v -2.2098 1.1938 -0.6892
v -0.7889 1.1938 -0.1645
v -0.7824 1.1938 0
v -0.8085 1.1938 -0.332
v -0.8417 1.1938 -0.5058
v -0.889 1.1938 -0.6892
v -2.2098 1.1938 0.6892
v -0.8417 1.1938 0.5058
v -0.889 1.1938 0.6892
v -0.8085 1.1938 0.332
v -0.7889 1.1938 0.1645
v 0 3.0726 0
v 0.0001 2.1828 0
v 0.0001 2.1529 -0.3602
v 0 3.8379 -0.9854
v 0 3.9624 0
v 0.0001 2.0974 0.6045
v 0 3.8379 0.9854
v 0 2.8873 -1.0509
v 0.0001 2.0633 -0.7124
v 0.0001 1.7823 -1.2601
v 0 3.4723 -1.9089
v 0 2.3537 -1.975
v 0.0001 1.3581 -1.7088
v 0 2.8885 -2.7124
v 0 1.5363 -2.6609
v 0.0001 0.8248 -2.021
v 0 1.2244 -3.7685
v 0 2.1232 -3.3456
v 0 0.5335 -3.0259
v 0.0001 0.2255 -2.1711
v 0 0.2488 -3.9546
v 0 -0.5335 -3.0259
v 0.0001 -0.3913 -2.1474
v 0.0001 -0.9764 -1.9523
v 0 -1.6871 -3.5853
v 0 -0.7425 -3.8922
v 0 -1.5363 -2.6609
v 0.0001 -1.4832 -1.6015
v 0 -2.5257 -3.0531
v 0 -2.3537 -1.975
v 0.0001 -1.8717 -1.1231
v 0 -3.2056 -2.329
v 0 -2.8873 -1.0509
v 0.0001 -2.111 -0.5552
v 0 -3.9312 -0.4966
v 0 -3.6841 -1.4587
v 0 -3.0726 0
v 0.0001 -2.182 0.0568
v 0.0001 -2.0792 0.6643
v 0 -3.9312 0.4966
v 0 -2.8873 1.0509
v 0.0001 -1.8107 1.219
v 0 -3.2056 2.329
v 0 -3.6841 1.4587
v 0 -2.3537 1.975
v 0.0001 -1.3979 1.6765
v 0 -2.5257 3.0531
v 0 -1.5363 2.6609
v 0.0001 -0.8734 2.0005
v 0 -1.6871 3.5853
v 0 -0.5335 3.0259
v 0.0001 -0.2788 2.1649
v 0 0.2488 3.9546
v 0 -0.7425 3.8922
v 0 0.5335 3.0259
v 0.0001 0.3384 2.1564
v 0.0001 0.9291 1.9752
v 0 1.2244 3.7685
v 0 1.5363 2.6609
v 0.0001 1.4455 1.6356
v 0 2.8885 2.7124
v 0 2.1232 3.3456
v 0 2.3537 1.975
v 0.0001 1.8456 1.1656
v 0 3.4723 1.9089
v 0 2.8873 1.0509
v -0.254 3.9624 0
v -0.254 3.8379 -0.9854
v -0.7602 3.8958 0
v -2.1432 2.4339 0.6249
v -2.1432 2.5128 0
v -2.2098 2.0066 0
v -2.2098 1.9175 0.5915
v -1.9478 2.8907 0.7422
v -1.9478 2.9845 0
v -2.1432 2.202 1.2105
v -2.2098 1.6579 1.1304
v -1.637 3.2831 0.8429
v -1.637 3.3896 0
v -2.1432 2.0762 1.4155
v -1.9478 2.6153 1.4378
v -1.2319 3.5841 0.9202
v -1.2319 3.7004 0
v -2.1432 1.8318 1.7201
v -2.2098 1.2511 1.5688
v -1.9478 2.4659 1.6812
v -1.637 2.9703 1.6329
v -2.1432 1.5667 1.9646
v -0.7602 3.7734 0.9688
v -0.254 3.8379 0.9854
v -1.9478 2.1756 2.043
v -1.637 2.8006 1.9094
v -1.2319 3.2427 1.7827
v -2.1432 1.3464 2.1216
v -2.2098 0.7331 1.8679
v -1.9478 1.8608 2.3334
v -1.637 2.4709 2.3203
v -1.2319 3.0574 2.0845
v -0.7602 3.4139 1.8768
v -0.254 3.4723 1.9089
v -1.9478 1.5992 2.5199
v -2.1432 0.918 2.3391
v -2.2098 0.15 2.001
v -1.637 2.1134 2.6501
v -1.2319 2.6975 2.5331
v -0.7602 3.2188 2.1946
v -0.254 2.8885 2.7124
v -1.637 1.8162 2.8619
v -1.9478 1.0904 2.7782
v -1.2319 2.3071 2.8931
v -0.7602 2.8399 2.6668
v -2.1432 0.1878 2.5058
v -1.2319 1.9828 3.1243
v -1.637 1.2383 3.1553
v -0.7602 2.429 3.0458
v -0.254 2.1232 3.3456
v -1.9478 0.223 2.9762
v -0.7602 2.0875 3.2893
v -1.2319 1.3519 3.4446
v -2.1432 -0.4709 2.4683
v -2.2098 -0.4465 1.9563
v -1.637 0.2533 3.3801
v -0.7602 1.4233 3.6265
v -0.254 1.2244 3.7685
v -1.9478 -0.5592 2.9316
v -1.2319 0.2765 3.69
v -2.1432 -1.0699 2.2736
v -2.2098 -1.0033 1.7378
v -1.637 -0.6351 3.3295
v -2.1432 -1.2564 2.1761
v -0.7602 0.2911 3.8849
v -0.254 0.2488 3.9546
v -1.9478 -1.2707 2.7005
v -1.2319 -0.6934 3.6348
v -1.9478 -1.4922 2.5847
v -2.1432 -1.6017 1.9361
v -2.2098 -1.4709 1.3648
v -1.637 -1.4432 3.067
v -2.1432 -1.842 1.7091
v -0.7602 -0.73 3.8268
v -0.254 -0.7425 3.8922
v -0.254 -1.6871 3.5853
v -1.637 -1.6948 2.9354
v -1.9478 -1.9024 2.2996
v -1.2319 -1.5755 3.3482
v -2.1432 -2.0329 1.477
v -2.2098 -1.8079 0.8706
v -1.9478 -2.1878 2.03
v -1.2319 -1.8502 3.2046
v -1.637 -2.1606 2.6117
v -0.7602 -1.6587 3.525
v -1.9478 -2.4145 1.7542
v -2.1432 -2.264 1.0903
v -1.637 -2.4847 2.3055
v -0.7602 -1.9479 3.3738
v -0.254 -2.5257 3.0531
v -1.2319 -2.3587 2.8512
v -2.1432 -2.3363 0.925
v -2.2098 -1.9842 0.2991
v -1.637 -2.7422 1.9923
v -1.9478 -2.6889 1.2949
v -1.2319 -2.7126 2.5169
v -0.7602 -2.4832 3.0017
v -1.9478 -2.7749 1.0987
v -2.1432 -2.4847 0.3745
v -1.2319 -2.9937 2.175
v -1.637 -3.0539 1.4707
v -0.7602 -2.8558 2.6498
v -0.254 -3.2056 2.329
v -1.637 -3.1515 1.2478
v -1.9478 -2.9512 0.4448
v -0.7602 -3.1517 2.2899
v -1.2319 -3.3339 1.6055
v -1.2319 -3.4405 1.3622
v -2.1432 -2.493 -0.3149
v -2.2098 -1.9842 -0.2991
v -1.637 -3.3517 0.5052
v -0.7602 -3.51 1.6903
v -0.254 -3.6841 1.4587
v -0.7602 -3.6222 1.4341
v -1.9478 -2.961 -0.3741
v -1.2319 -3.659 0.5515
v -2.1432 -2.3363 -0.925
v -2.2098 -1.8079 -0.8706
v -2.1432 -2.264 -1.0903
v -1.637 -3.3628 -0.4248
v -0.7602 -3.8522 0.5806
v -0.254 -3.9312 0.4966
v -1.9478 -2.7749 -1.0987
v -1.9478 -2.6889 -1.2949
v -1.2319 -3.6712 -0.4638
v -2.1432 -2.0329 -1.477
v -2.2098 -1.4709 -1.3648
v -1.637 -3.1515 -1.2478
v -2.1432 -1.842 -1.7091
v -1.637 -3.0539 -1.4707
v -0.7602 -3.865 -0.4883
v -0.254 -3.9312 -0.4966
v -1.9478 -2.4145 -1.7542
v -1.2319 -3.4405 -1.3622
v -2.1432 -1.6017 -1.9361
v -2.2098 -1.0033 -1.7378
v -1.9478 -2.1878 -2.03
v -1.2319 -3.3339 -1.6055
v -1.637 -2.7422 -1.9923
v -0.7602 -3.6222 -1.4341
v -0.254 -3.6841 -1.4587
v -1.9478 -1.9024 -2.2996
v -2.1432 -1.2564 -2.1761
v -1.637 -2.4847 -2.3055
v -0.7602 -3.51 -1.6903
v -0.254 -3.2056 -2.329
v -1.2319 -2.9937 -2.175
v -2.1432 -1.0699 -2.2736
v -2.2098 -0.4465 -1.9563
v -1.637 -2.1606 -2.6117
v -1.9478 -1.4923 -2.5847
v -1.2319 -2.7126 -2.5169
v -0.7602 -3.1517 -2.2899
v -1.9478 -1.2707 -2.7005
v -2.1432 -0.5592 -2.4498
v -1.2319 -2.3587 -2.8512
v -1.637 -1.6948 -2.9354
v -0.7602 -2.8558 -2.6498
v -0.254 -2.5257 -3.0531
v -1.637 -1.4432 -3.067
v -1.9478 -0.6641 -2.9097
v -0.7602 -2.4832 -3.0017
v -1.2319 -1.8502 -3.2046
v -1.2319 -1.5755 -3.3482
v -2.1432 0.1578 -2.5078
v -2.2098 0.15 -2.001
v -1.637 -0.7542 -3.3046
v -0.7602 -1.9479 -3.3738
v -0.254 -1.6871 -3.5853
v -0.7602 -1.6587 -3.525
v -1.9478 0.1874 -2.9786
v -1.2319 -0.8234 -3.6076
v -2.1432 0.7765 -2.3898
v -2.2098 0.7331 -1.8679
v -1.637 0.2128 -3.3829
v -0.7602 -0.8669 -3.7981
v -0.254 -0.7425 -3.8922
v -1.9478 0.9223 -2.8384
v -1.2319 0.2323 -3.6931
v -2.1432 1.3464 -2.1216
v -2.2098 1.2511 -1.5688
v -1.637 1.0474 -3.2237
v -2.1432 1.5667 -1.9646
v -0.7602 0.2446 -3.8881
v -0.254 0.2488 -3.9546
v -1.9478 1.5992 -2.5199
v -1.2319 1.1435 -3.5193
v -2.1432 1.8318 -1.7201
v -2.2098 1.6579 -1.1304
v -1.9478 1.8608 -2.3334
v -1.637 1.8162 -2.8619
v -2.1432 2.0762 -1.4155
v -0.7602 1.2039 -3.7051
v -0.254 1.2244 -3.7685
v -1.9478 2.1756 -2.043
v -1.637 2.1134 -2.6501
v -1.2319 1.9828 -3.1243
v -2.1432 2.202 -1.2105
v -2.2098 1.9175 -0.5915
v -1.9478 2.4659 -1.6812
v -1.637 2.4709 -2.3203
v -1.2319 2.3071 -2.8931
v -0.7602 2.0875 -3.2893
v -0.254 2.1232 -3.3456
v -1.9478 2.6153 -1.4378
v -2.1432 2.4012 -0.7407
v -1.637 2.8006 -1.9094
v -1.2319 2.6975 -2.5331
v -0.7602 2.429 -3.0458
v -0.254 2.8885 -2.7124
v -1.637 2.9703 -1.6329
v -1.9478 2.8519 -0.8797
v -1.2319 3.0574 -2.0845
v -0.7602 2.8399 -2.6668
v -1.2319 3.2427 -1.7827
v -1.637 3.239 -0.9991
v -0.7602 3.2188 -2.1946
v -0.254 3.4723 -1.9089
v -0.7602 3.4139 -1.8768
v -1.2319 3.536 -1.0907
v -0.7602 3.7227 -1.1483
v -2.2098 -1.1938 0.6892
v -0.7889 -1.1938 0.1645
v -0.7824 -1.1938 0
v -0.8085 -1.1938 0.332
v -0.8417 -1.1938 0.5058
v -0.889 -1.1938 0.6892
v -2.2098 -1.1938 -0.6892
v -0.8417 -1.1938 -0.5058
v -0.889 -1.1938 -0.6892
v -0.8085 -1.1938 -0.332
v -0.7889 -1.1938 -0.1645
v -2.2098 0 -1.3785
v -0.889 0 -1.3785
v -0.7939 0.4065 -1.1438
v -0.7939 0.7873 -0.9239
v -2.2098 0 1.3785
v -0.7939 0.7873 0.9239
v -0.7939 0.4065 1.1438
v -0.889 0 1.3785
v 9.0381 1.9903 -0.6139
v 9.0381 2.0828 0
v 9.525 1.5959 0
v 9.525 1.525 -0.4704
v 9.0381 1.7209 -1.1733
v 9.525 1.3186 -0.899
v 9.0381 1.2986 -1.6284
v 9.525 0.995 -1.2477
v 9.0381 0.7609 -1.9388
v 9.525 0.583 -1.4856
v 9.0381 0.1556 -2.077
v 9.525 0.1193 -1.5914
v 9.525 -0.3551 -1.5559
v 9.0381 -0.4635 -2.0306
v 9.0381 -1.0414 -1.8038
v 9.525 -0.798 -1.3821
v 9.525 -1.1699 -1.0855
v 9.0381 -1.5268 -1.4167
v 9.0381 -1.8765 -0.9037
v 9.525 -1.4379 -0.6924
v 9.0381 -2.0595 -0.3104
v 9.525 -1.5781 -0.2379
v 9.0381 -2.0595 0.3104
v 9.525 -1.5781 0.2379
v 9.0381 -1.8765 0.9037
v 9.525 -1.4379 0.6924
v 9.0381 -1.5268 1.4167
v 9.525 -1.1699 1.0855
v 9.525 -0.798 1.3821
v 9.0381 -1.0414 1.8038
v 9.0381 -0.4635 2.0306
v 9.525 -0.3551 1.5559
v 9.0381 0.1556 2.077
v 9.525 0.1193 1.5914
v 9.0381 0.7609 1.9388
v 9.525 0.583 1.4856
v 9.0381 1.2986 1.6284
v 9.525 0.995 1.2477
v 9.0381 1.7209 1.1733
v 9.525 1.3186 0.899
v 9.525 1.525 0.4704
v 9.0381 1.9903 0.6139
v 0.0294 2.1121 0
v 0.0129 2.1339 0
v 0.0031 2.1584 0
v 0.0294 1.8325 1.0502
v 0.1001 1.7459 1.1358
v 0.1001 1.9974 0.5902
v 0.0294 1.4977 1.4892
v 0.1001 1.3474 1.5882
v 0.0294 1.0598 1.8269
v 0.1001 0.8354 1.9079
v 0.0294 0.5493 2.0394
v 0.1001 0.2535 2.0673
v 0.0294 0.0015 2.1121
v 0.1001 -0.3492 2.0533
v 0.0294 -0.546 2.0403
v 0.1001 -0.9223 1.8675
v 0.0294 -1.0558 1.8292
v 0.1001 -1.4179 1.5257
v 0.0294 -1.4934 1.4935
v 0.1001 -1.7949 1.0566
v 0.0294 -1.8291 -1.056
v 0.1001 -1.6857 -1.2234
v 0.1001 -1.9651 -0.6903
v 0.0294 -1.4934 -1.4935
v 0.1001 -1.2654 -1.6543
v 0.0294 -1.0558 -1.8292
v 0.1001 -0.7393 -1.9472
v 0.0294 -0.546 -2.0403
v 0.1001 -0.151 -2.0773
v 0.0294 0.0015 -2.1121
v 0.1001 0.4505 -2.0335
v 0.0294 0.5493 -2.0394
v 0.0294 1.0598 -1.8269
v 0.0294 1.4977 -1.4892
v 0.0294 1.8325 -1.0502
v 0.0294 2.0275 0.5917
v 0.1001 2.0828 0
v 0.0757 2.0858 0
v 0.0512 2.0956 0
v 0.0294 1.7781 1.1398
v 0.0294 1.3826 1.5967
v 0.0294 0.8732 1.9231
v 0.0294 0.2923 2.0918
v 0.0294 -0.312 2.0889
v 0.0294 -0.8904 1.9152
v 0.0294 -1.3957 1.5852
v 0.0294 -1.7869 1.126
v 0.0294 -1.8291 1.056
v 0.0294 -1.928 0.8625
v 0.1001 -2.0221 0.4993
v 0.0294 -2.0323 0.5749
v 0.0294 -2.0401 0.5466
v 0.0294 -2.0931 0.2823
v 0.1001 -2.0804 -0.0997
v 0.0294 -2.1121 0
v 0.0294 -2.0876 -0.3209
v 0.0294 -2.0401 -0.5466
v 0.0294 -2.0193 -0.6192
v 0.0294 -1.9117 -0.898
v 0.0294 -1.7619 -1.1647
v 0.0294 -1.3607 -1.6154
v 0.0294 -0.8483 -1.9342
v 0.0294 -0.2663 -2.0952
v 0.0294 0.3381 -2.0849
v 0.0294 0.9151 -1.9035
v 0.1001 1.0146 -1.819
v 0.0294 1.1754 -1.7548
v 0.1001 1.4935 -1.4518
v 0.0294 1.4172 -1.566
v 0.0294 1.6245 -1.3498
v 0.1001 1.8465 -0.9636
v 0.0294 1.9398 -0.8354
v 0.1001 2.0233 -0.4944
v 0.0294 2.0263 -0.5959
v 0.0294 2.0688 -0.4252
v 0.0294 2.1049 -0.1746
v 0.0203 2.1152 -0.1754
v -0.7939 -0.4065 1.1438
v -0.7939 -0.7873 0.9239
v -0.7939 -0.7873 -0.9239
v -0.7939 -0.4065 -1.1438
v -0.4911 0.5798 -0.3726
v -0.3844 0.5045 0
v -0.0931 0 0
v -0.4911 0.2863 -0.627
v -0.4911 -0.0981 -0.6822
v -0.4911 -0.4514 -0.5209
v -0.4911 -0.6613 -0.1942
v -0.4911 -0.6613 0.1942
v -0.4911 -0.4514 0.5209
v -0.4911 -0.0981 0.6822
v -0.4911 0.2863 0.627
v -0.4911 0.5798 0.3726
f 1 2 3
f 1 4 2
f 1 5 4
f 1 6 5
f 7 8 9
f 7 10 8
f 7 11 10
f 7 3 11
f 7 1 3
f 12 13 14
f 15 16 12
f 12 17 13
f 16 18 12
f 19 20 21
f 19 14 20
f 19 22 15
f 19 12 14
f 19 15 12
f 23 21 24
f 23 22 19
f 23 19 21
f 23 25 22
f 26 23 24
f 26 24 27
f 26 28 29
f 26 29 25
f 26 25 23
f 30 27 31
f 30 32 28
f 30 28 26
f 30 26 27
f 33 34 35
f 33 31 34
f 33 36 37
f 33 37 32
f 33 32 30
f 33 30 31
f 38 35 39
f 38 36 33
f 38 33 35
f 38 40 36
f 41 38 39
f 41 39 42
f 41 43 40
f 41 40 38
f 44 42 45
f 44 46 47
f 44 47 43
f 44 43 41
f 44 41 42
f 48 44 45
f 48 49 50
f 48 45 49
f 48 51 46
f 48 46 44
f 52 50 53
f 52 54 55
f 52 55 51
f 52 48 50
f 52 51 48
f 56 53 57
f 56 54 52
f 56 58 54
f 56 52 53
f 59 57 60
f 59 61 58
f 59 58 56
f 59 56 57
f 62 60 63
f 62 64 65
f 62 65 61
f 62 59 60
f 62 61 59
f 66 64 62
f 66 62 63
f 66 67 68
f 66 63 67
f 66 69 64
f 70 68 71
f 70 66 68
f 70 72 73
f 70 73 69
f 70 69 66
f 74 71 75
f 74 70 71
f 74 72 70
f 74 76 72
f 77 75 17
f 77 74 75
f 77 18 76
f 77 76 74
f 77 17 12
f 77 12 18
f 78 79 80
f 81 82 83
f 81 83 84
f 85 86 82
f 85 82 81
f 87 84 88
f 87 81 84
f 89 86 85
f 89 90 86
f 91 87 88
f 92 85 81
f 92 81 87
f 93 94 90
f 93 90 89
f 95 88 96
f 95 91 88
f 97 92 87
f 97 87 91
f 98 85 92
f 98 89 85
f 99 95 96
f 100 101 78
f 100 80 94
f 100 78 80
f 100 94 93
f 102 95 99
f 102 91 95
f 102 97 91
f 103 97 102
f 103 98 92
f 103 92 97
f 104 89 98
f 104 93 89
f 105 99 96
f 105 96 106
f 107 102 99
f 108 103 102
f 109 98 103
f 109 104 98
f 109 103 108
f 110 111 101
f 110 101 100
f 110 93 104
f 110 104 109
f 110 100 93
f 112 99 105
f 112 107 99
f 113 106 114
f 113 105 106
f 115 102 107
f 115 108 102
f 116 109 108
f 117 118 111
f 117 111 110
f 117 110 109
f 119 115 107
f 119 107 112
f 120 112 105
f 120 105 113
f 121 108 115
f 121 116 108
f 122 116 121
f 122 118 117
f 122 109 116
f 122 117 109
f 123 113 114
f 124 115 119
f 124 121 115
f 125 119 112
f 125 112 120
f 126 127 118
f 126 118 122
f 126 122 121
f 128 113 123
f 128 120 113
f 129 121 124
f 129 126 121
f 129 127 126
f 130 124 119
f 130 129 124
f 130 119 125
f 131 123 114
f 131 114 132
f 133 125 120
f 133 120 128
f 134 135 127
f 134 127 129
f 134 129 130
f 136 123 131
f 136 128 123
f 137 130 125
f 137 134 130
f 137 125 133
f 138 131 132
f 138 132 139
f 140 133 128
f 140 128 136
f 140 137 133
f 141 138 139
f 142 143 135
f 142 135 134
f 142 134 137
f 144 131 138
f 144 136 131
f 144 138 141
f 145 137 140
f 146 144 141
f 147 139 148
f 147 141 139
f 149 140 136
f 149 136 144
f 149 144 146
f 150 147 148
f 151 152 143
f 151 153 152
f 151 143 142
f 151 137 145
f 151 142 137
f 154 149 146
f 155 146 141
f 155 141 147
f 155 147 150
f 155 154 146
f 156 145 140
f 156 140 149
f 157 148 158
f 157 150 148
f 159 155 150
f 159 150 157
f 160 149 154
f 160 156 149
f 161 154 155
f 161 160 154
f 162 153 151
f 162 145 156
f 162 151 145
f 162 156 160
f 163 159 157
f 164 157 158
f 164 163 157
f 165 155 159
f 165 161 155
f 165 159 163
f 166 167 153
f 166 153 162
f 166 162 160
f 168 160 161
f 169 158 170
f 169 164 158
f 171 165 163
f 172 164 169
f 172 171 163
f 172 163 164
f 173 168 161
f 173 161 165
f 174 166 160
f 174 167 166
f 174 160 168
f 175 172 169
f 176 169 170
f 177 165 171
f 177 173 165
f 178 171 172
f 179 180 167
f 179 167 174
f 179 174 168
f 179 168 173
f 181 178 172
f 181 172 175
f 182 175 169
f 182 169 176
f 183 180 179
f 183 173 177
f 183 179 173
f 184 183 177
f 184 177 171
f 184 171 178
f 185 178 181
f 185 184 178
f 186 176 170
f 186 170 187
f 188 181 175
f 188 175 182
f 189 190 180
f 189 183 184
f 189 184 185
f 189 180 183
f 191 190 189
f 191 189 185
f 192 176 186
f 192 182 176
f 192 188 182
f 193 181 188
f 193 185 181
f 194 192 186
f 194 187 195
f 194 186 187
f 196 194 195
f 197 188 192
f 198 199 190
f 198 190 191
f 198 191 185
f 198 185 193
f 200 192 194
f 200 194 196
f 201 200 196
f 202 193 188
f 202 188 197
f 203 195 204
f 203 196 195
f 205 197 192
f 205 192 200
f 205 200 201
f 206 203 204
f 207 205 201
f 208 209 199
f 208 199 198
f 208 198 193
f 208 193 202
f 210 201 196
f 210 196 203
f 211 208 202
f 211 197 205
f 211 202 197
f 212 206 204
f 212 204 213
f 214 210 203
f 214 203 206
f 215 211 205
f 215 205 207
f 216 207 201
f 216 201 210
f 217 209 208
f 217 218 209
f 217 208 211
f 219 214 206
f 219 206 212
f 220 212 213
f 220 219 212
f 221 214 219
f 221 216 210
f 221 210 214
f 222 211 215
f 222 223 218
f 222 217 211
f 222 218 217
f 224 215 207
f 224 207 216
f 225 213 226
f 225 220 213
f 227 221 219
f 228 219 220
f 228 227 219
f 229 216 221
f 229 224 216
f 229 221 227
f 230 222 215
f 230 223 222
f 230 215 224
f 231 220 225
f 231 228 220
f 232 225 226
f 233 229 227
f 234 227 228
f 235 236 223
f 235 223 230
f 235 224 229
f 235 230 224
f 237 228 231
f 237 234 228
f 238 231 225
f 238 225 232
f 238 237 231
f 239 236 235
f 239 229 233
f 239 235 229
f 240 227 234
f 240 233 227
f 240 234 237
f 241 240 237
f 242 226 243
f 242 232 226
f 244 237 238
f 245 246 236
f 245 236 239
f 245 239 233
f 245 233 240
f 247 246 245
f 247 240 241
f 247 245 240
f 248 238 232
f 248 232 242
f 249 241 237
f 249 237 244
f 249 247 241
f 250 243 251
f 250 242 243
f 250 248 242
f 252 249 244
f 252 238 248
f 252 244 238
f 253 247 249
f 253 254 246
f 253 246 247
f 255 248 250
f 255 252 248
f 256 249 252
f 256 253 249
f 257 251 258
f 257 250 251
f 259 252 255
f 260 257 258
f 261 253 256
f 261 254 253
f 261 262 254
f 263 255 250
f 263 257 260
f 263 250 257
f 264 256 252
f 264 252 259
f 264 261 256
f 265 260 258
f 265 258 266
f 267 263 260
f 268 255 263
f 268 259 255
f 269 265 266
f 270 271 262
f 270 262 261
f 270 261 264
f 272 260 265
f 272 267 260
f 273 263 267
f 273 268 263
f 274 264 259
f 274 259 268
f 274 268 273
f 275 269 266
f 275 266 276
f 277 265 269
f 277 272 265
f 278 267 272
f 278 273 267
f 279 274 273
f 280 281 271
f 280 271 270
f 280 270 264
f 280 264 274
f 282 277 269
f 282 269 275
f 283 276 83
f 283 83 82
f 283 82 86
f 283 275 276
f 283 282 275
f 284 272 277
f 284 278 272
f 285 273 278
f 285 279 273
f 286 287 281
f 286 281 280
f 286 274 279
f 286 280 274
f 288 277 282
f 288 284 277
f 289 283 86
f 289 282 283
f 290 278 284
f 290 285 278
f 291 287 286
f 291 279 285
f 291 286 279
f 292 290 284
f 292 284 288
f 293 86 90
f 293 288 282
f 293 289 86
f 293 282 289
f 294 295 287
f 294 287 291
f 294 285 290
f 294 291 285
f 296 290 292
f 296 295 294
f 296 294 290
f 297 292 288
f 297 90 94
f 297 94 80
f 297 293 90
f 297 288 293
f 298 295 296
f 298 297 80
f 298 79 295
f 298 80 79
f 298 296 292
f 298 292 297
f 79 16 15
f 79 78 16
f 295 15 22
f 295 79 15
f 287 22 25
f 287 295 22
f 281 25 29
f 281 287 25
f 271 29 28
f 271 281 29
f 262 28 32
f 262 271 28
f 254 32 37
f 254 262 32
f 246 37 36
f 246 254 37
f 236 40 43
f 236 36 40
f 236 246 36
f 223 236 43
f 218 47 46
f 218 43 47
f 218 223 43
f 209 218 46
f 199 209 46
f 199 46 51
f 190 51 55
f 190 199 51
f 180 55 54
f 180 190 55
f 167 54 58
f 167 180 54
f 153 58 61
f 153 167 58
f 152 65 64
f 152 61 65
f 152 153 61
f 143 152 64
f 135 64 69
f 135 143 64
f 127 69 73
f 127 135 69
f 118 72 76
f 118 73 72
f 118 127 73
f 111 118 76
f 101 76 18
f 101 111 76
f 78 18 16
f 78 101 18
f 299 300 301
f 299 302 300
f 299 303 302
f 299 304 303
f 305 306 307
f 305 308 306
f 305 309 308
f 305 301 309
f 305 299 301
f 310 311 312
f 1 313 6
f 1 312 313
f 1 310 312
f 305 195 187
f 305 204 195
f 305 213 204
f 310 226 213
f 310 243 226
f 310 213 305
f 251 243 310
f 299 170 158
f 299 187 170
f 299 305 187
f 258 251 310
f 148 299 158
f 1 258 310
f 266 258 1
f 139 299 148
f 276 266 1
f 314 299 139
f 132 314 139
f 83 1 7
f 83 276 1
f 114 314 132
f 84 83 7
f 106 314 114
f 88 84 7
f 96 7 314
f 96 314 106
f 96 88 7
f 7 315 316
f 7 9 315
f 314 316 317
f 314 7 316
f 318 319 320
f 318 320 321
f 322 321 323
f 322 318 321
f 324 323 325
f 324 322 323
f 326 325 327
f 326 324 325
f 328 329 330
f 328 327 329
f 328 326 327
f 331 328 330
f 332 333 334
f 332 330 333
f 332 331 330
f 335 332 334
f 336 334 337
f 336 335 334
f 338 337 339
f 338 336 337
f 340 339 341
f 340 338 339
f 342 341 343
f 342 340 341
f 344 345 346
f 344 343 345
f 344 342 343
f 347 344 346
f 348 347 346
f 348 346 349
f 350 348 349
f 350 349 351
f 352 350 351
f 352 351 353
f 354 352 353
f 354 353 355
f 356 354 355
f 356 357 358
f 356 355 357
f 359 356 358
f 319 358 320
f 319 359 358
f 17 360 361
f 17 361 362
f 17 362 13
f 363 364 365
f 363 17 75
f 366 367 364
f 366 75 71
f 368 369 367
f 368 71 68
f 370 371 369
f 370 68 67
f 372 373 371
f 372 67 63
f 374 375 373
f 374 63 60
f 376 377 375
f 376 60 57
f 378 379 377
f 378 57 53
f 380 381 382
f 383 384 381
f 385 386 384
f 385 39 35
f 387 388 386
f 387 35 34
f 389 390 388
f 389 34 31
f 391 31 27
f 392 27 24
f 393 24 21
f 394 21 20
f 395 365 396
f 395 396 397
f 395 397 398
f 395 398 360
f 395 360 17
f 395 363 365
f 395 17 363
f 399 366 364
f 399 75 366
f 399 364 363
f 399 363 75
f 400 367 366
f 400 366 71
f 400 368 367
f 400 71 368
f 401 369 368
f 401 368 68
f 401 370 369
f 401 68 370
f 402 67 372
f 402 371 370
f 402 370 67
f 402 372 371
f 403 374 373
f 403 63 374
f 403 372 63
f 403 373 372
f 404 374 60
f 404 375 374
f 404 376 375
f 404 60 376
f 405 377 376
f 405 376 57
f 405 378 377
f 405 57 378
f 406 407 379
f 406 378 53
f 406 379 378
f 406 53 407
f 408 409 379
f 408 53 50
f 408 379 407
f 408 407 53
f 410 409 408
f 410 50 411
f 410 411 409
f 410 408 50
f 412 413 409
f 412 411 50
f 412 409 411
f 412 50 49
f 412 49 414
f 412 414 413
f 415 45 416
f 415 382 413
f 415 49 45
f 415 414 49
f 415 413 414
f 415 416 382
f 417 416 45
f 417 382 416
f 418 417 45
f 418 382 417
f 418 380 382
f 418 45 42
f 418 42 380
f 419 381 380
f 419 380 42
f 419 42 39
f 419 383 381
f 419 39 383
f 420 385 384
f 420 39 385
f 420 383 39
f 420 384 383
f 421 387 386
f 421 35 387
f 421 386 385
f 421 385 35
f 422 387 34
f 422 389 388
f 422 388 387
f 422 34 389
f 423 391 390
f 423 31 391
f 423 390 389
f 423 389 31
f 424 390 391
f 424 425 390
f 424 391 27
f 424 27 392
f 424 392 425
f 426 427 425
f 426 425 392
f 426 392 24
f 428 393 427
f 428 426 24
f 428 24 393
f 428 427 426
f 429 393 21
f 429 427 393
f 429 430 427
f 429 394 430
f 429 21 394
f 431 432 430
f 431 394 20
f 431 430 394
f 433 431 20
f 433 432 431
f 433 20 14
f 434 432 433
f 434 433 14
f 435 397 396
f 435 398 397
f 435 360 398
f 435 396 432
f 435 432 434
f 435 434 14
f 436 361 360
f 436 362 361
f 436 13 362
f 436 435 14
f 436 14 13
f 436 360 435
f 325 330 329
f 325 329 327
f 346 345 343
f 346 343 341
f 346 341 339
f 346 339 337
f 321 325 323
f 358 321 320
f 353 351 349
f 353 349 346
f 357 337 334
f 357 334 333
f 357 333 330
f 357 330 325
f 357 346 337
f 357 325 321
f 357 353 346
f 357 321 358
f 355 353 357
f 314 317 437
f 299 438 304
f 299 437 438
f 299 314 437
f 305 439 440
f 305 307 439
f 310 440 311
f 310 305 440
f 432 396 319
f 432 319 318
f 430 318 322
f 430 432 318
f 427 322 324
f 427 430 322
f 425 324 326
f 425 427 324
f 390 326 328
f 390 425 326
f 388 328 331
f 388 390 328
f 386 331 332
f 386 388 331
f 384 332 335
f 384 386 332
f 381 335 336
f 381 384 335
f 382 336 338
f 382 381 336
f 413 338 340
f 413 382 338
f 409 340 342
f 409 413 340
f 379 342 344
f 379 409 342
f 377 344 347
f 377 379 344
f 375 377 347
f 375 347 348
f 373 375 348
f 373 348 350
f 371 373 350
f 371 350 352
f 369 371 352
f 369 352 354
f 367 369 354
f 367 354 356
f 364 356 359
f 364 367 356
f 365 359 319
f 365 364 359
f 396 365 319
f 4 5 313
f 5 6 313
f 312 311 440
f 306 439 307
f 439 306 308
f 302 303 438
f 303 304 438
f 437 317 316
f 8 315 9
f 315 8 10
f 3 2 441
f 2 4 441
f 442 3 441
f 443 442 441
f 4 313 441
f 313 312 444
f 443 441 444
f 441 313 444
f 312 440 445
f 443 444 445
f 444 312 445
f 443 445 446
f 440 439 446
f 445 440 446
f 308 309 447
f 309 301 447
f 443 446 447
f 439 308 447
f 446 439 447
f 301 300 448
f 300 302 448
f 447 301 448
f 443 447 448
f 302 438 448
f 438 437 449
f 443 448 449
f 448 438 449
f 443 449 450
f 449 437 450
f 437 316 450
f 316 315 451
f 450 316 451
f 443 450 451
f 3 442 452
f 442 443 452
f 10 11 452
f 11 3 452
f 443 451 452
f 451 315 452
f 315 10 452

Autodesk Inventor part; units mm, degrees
ref_plane "YZ Plane" through (0, 0, 0) normal (1, 0, 0) x (0, 1, 0)
ref_plane "XZ Plane" through (0, 0, 0) normal (0, 1, 0) x (-1, 0, 0)
sketch "Sketch1" plane through (0, 0, 0) normal (0, 0, 1) x (1, 0, 0)
  line L0 (-0.0931, 0) -> (9.525, 0)
  line L1 (9.525, 0) -> (9.525, 2.0828)
  line L2 (9.525, 2.0828) -> (1.5902, 2.0828)
  line L3 (1.5902, 2.0828) -> (0.0001, 2.0828)
  line L4 (0.0001, 2.0828) -> (0, 2.0828)
  line L5 (0, 2.0828) -> (0, 3.9624)
  line L6 (0, 3.9624) -> (-2.2098, 3.9624)
  line L7 (-2.2098, 3.9624) -> (-2.2098, 1.3785)
  line L8 (-2.2098, 1.3785) -> (-0.889, 1.3785)
  line L9 (-0.889, 1.3785) -> (-0.0931, 0)
  line L10 (-4.5568, 0) -> (11.872, 0) projected
  line L11 (0, -0.7925) -> (0, 4.7549) projected
  line L12 (1.5902, 2.0828) -> (0, 2.0828) construction
  dimension "d1" = 7.9348
  dimension "d2" = 1.5901
  dimension "d3" = 2.2098
  dimension "d4" = 1.3208
  dimension "d5" = 60
  dimension "d6" = 4.1656
  dimension "d7" = 4.1656
  dimension "d8" = 2.757
  dimension "d9" = 7.9248
  dimension "d26" = 9.525
revolve "Body" add sketch "Sketch1" angle 360 about axis through (-0.0931, 0, 0) along (1, 0, 0)
sketch "Sketch2" plane through (-2.2098, 0, 0) normal (-1, 0, 0) x (0, 0, 1)
  circle A0 centre (0, 0) radius 1.3785 projected
  line L0 (0, -5.5474) -> (0, 5.5474) projected
  line L1 (-5.5474, 0) -> (5.5474, 0) projected
  line L2 (1.3785, 0) -> (0.6892, -1.1938)
  line L3 (0.6892, -1.1938) -> (-0.6892, -1.1938)
  line L4 (-0.6892, -1.1938) -> (-1.3785, 0)
  line L5 (-1.3785, 0) -> (-0.6892, 1.1938)
  line L6 (-0.6892, 1.1938) -> (0.6892, 1.1938)
  line L7 (0.6892, 1.1938) -> (1.3785, 0)
extrude "Slot" add sketch "Sketch2" against normal up to next contours L7 A0 | A0 L2 | L6 L0 A0 | A0 L0 L3 | L0 L6 A0 | A0 L3 L0 | L4 A0 | A0 L5
fillet "Fillet1" radius 1.9558 1 edges at (-2.2098, -3.9624, 0)
thread "Thread" size "8-32 UNC" class "2A" standard "ANSI Unified Screw Threads" length 7.9348
chamfer "Chamfer1" distance 0.4869 distance2 0.4869 1 edges at (9.525, -2.0828, 0) measured on face at (9.525, -0.1898, 0.4203)
ref_plane "Work Plane1" through (29, 0, 0) normal (0, -1, 0) x (1, 0, 0)
fillet "Fillet2" radius 0.1 1 edges at (0.0001, -2.0828, 0)
equation "\"d30\" = R"
equation "\"d17\" = RR"
equation "\"d13\" = GEL"
equation "\"d15\" = -0.5 * SPD + 0.5 * GD"
equation "\"d16\" = GUL"
equation "\"d1\" = GEL"
equation "\"d3\" = KOH"
equation "\"d4\" = INTI"
equation "\"d6\" = GD"
equation "\"d7\" = BDM"
equation "\"d8\" = 1.1547 * SW"
equation "\"d9\" = KOD"
equation "\"d26\" = NLG"
equation "\"GD\" = NND"
equation "\"NLG\" = 9.525"
equation "\"GEL\" = 7.93476"
equation "\"KOD\" = 7.9248"
equation "\"KOH\" = 2.2098"
equation "\"INTI\" = 1.3208"
equation "\"GAL\" = 1.59004"
equation "\"GUL\" = 0.48692"
equation "\"BDM\" = NND"
equation "\"SW\" = 2.3876"
equation "\"RR\" = 1.9558"
equation "\"SPD\" = 3.19176"
equation "\"R\" = 0.1"
equation "\"TOA\" = 30deg"
equation "\"GD1\" = SPD"
equation "\"THREADDIA\" = 4.1656"
equation "\"KOH1\" = 0.381"
equation "\"NND\" = 4.1656"
equation "\"E0\" = 2.75768"
properties part number "ANSI B18.3 - 8 - 32 x 3/8" material "Steel, Mild"
